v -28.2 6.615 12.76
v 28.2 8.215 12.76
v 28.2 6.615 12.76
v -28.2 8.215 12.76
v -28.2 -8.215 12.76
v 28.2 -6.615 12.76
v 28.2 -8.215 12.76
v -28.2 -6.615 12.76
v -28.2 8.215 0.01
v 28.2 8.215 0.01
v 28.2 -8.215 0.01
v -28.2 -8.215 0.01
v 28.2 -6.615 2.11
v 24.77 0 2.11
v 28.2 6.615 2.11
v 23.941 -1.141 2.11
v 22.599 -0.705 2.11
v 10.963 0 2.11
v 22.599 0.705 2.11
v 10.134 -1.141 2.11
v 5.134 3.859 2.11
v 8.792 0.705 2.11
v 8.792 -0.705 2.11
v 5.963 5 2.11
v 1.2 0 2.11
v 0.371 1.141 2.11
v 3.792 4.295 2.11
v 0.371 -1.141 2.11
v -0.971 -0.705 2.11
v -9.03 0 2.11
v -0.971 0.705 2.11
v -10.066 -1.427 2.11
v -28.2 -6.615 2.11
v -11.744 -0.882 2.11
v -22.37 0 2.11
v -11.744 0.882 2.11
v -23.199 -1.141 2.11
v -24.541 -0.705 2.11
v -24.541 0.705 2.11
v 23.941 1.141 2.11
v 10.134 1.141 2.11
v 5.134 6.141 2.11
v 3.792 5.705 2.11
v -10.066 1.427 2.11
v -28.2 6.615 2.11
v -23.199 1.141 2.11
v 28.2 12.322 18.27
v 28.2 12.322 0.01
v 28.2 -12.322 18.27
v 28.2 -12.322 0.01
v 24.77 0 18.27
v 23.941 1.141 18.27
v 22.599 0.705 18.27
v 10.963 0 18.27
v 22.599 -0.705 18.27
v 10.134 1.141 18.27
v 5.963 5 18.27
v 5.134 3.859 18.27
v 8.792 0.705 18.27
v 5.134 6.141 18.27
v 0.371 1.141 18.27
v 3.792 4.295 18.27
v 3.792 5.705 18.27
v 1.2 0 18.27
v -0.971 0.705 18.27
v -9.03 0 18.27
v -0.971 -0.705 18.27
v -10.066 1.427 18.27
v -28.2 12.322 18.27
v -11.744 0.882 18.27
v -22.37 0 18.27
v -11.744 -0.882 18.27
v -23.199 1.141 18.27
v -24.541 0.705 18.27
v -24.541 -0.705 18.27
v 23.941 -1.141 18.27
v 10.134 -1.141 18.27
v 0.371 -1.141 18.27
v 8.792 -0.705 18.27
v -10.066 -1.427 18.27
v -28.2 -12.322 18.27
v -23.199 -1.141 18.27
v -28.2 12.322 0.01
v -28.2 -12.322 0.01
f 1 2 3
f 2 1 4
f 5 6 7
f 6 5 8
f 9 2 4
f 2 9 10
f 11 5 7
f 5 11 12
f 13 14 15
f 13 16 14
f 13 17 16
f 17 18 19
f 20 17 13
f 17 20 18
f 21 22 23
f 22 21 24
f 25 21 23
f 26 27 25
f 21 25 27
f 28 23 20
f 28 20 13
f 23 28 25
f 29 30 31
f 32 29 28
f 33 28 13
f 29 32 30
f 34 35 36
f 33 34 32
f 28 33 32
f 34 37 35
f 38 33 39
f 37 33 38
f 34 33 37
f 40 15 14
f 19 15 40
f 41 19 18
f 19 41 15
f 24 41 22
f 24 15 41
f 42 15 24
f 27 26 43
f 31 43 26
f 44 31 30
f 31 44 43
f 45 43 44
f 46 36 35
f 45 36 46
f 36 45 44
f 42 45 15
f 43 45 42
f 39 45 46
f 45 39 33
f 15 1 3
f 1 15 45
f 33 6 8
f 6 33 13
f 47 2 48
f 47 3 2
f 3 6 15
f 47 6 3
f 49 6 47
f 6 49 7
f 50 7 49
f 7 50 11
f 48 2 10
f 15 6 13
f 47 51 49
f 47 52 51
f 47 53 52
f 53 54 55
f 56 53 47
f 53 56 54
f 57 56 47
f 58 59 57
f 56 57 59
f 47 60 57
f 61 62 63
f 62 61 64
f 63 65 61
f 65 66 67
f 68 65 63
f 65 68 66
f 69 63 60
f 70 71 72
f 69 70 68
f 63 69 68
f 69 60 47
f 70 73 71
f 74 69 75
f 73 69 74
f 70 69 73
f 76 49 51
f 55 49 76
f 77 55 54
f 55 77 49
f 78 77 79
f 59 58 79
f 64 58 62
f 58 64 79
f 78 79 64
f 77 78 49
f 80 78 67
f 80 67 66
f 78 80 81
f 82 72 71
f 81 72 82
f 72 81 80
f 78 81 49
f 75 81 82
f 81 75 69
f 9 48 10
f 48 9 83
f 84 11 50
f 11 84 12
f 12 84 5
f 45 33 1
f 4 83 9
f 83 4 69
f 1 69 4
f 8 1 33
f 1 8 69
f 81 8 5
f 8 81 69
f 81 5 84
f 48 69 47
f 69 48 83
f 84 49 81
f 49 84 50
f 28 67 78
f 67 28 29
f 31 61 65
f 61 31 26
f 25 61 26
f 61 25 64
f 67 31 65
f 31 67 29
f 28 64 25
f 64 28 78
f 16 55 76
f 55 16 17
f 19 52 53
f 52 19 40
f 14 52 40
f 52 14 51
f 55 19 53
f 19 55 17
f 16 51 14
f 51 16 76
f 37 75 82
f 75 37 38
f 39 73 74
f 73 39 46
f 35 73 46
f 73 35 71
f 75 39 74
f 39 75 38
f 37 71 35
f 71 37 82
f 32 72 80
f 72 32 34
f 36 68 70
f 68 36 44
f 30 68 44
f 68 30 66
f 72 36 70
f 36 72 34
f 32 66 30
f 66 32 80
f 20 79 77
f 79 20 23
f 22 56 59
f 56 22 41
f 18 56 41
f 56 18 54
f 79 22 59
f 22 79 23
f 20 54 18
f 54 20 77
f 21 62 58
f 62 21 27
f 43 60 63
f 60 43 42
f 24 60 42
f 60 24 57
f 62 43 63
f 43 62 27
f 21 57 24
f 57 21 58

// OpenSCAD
// generate C-channel for later use in cut-outs

mW = 16.33;
mH = 12.66;
L = 120;
pad=.1;
W = mW+pad;
H = mH+pad;
block = [L,W,H];
cutW = (1.5 * 2) + (pad * 2);
cutH = (2.0 + pad);
n23W = 56.4;
n23mounts = 47.14 / 2;
n23circleD = 38.1;
offL = n23circleD - n23mounts - 4;
n23hypholes = n23mounts * sqrt(2);  // diagonal to center from mount

difference(){
translate([0,0,(H+5.5)/2 + .01])
cube([n23W,W*1.5,H+5.5], center=true);

	cylinder(r=1.2,h=H*3,center=true);
	translate([n23mounts,0,0])
	cylinder(r=1.2,h=H*3,center=true);
	translate([-n23mounts,0,0])
	cylinder(r=1.2,h=H*3,center=true);
	translate([-offL,0,0])
	cylinder(r=1.5,h=H*3,center=true);
	translate([n23hypholes-n23mounts,0,0])
	cylinder(r=1.2,h=H*3,center=true);
	translate([n23hypholes-n23mounts-5,5,0])
	cylinder(r=1.2,h=H*3,center=true);
	translate([0,0,H/2])
	difference(){
		cube(block, center=true);
	
		translate([0,0,cutH/2+.01])
			cube([L,W-cutW, H-cutH], center=true);
	}
}
